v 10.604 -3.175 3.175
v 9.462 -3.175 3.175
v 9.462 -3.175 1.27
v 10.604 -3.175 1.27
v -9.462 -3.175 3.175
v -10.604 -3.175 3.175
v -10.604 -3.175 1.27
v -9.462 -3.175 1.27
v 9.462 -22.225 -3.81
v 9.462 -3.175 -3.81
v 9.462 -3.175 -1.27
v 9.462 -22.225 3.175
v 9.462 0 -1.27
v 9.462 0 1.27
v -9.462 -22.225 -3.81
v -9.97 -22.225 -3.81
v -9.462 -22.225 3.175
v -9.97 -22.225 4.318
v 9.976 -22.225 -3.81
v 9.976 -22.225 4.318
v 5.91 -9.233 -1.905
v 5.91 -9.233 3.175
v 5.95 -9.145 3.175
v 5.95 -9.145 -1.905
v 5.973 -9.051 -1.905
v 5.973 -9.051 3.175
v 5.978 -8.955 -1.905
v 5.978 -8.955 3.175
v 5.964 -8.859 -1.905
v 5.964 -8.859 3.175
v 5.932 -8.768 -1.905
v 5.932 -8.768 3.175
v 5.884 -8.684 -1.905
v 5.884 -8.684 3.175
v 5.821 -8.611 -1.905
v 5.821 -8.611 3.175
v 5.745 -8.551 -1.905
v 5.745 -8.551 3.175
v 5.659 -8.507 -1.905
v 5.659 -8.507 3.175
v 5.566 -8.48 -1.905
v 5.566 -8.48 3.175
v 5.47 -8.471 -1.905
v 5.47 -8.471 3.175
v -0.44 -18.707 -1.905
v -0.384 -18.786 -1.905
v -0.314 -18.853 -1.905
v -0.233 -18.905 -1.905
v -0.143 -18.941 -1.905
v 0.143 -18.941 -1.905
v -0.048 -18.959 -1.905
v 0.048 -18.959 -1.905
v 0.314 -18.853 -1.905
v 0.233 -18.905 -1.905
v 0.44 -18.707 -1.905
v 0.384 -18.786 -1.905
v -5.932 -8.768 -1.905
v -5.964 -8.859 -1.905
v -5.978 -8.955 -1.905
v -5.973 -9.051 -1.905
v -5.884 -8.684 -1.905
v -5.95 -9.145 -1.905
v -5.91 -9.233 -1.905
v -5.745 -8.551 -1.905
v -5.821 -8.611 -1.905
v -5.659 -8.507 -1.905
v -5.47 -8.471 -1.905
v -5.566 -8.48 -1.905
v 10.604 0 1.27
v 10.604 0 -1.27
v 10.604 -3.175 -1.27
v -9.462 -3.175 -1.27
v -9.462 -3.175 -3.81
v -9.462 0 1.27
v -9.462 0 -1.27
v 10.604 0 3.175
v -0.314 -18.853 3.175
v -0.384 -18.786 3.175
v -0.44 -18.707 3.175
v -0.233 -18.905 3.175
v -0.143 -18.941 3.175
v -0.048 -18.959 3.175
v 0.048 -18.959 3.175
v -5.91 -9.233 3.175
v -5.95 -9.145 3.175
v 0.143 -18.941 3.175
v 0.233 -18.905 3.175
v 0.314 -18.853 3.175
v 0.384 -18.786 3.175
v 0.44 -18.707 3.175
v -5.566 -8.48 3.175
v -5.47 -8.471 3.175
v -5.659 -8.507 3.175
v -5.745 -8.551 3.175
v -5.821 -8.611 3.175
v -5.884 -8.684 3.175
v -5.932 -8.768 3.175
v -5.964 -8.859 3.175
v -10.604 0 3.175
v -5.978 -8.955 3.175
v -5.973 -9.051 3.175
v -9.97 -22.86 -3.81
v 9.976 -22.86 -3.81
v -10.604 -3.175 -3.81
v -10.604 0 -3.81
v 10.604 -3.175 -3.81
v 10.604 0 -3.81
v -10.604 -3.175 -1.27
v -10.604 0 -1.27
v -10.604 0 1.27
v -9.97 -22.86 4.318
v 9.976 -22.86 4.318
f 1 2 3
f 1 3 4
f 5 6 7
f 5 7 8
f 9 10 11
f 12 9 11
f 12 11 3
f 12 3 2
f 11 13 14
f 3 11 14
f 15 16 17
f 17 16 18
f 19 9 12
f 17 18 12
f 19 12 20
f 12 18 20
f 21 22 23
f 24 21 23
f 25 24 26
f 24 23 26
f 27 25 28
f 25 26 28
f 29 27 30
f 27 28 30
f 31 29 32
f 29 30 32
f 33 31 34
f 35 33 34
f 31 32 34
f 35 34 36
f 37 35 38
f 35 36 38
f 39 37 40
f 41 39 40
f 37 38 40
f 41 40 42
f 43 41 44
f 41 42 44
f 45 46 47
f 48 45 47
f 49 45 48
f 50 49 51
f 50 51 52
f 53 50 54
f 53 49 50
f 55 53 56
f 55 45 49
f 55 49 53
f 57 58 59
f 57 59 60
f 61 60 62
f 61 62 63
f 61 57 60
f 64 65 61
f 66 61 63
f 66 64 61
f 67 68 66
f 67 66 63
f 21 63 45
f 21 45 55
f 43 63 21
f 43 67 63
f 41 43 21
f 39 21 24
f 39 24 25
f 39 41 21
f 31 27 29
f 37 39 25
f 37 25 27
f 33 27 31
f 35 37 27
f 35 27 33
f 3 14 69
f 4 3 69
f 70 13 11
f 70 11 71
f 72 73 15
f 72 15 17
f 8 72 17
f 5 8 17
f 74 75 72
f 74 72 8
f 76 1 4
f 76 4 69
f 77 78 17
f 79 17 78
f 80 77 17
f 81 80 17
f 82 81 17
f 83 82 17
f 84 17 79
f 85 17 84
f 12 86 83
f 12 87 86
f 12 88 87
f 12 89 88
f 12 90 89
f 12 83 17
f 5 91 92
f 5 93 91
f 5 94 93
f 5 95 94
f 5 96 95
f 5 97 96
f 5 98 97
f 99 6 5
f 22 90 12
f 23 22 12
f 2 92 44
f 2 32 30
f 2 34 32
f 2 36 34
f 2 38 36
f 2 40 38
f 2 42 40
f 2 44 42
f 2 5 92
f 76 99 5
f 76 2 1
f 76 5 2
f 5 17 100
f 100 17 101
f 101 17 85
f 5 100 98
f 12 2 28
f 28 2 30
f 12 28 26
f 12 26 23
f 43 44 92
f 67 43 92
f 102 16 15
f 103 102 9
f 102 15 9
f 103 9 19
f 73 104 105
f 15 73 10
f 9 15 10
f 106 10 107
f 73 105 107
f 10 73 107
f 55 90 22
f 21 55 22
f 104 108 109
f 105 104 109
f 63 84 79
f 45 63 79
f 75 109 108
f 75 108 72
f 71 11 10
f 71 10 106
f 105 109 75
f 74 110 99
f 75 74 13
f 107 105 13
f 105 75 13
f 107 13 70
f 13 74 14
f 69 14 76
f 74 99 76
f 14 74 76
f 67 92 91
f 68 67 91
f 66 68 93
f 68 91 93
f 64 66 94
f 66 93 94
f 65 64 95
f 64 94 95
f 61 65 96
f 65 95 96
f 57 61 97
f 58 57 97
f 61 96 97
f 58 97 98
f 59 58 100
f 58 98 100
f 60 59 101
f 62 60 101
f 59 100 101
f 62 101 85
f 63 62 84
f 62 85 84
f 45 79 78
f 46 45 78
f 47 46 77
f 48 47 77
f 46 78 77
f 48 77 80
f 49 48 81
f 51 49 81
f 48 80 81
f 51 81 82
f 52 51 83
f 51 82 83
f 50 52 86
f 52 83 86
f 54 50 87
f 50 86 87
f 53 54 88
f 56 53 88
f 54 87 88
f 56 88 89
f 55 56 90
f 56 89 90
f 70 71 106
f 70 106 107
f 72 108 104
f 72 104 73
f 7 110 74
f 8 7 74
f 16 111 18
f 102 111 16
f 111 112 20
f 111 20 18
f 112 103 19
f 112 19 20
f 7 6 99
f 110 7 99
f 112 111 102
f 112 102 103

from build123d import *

# Parameters (mm, degrees)
F0_W     = 18.923
F0_H     = 6.985
F1_DEPTH = 22.86
F3_DEPTH = 0.635
F5_DEPTH = 5.08
F4_W     = 1.143
F4_H     = 3.175
F6_DEPTH = 6.985
F7_W     = 1.143
F7_H     = 2.54
F8_DEPTH = 12.7


# Not quite as in the source:
# - a feature names something its author has since deleted; it is built from what else it names


with BuildPart() as f1:
    # F0 (on Front) → F1 (new body)
    with BuildSketch(Plane.XZ):
        with Locations((0, -0.3175)):
            Rectangle(F0_W, F0_H)
    extrude(amount=F1_DEPTH)

    # F2 (on face) → F3 (join)
    with BuildSketch(Plane.XZ.offset(22.86)):
        Polygon((9.9764279214, 4.318), (-9.9695, 4.318), (-9.9695, -3.81), (-9.4615, -3.81), (-9.4615, 3.175), (9.4615, 3.175), (9.4615, -3.81), (9.9764279214, -3.81), align=None)
    extrude(amount=-F3_DEPTH)

    # F4 (on face) → F5 (cut)
    with BuildSketch(Plane.XY.offset(3.175)):
        with BuildLine():
            ThreePointArc((5.9100590949, -9.232738686), (5.9100590949, -8.724738686), (5.4701181898, -8.470738686))
            Line((5.4701181898, -8.470738686), (-5.4701181898, -8.470738686))
            ThreePointArc((-5.4701181898, -8.470738686), (-5.9100590949, -8.724738686), (-5.9100590949, -9.232738686))
            Line((-5.9100590949, -9.232738686), (-0.4399409051, -18.707261314))
            ThreePointArc((-0.4399409051, -18.707261314), (0, -18.961261314), (0.4399409051, -18.707261314))
            Line((0.4399409051, -18.707261314), (5.9100590949, -9.232738686))
        make_face()
    extrude(amount=-F5_DEPTH, mode=Mode.SUBTRACT)

    # F4 (on face) → F6 (join, through all)
    with BuildSketch(Plane.XY.offset(3.175)):
        with Locations((-10.033, -1.5875)):
            Rectangle(F4_W, F4_H)
        with Locations((10.033, -1.5875)):
            Rectangle(F4_W, F4_H)
    extrude(amount=-F6_DEPTH)

    # F7 (on face) → F8 (cut)
    with BuildSketch(Plane.XZ):
        with Locations((10.033, 0)):
            Rectangle(F7_W, F7_H)
        with Locations((-10.033, 0)):
            Rectangle(F7_W, F7_H)
    extrude(amount=F8_DEPTH, mode=Mode.SUBTRACT)


solid = f1.part
